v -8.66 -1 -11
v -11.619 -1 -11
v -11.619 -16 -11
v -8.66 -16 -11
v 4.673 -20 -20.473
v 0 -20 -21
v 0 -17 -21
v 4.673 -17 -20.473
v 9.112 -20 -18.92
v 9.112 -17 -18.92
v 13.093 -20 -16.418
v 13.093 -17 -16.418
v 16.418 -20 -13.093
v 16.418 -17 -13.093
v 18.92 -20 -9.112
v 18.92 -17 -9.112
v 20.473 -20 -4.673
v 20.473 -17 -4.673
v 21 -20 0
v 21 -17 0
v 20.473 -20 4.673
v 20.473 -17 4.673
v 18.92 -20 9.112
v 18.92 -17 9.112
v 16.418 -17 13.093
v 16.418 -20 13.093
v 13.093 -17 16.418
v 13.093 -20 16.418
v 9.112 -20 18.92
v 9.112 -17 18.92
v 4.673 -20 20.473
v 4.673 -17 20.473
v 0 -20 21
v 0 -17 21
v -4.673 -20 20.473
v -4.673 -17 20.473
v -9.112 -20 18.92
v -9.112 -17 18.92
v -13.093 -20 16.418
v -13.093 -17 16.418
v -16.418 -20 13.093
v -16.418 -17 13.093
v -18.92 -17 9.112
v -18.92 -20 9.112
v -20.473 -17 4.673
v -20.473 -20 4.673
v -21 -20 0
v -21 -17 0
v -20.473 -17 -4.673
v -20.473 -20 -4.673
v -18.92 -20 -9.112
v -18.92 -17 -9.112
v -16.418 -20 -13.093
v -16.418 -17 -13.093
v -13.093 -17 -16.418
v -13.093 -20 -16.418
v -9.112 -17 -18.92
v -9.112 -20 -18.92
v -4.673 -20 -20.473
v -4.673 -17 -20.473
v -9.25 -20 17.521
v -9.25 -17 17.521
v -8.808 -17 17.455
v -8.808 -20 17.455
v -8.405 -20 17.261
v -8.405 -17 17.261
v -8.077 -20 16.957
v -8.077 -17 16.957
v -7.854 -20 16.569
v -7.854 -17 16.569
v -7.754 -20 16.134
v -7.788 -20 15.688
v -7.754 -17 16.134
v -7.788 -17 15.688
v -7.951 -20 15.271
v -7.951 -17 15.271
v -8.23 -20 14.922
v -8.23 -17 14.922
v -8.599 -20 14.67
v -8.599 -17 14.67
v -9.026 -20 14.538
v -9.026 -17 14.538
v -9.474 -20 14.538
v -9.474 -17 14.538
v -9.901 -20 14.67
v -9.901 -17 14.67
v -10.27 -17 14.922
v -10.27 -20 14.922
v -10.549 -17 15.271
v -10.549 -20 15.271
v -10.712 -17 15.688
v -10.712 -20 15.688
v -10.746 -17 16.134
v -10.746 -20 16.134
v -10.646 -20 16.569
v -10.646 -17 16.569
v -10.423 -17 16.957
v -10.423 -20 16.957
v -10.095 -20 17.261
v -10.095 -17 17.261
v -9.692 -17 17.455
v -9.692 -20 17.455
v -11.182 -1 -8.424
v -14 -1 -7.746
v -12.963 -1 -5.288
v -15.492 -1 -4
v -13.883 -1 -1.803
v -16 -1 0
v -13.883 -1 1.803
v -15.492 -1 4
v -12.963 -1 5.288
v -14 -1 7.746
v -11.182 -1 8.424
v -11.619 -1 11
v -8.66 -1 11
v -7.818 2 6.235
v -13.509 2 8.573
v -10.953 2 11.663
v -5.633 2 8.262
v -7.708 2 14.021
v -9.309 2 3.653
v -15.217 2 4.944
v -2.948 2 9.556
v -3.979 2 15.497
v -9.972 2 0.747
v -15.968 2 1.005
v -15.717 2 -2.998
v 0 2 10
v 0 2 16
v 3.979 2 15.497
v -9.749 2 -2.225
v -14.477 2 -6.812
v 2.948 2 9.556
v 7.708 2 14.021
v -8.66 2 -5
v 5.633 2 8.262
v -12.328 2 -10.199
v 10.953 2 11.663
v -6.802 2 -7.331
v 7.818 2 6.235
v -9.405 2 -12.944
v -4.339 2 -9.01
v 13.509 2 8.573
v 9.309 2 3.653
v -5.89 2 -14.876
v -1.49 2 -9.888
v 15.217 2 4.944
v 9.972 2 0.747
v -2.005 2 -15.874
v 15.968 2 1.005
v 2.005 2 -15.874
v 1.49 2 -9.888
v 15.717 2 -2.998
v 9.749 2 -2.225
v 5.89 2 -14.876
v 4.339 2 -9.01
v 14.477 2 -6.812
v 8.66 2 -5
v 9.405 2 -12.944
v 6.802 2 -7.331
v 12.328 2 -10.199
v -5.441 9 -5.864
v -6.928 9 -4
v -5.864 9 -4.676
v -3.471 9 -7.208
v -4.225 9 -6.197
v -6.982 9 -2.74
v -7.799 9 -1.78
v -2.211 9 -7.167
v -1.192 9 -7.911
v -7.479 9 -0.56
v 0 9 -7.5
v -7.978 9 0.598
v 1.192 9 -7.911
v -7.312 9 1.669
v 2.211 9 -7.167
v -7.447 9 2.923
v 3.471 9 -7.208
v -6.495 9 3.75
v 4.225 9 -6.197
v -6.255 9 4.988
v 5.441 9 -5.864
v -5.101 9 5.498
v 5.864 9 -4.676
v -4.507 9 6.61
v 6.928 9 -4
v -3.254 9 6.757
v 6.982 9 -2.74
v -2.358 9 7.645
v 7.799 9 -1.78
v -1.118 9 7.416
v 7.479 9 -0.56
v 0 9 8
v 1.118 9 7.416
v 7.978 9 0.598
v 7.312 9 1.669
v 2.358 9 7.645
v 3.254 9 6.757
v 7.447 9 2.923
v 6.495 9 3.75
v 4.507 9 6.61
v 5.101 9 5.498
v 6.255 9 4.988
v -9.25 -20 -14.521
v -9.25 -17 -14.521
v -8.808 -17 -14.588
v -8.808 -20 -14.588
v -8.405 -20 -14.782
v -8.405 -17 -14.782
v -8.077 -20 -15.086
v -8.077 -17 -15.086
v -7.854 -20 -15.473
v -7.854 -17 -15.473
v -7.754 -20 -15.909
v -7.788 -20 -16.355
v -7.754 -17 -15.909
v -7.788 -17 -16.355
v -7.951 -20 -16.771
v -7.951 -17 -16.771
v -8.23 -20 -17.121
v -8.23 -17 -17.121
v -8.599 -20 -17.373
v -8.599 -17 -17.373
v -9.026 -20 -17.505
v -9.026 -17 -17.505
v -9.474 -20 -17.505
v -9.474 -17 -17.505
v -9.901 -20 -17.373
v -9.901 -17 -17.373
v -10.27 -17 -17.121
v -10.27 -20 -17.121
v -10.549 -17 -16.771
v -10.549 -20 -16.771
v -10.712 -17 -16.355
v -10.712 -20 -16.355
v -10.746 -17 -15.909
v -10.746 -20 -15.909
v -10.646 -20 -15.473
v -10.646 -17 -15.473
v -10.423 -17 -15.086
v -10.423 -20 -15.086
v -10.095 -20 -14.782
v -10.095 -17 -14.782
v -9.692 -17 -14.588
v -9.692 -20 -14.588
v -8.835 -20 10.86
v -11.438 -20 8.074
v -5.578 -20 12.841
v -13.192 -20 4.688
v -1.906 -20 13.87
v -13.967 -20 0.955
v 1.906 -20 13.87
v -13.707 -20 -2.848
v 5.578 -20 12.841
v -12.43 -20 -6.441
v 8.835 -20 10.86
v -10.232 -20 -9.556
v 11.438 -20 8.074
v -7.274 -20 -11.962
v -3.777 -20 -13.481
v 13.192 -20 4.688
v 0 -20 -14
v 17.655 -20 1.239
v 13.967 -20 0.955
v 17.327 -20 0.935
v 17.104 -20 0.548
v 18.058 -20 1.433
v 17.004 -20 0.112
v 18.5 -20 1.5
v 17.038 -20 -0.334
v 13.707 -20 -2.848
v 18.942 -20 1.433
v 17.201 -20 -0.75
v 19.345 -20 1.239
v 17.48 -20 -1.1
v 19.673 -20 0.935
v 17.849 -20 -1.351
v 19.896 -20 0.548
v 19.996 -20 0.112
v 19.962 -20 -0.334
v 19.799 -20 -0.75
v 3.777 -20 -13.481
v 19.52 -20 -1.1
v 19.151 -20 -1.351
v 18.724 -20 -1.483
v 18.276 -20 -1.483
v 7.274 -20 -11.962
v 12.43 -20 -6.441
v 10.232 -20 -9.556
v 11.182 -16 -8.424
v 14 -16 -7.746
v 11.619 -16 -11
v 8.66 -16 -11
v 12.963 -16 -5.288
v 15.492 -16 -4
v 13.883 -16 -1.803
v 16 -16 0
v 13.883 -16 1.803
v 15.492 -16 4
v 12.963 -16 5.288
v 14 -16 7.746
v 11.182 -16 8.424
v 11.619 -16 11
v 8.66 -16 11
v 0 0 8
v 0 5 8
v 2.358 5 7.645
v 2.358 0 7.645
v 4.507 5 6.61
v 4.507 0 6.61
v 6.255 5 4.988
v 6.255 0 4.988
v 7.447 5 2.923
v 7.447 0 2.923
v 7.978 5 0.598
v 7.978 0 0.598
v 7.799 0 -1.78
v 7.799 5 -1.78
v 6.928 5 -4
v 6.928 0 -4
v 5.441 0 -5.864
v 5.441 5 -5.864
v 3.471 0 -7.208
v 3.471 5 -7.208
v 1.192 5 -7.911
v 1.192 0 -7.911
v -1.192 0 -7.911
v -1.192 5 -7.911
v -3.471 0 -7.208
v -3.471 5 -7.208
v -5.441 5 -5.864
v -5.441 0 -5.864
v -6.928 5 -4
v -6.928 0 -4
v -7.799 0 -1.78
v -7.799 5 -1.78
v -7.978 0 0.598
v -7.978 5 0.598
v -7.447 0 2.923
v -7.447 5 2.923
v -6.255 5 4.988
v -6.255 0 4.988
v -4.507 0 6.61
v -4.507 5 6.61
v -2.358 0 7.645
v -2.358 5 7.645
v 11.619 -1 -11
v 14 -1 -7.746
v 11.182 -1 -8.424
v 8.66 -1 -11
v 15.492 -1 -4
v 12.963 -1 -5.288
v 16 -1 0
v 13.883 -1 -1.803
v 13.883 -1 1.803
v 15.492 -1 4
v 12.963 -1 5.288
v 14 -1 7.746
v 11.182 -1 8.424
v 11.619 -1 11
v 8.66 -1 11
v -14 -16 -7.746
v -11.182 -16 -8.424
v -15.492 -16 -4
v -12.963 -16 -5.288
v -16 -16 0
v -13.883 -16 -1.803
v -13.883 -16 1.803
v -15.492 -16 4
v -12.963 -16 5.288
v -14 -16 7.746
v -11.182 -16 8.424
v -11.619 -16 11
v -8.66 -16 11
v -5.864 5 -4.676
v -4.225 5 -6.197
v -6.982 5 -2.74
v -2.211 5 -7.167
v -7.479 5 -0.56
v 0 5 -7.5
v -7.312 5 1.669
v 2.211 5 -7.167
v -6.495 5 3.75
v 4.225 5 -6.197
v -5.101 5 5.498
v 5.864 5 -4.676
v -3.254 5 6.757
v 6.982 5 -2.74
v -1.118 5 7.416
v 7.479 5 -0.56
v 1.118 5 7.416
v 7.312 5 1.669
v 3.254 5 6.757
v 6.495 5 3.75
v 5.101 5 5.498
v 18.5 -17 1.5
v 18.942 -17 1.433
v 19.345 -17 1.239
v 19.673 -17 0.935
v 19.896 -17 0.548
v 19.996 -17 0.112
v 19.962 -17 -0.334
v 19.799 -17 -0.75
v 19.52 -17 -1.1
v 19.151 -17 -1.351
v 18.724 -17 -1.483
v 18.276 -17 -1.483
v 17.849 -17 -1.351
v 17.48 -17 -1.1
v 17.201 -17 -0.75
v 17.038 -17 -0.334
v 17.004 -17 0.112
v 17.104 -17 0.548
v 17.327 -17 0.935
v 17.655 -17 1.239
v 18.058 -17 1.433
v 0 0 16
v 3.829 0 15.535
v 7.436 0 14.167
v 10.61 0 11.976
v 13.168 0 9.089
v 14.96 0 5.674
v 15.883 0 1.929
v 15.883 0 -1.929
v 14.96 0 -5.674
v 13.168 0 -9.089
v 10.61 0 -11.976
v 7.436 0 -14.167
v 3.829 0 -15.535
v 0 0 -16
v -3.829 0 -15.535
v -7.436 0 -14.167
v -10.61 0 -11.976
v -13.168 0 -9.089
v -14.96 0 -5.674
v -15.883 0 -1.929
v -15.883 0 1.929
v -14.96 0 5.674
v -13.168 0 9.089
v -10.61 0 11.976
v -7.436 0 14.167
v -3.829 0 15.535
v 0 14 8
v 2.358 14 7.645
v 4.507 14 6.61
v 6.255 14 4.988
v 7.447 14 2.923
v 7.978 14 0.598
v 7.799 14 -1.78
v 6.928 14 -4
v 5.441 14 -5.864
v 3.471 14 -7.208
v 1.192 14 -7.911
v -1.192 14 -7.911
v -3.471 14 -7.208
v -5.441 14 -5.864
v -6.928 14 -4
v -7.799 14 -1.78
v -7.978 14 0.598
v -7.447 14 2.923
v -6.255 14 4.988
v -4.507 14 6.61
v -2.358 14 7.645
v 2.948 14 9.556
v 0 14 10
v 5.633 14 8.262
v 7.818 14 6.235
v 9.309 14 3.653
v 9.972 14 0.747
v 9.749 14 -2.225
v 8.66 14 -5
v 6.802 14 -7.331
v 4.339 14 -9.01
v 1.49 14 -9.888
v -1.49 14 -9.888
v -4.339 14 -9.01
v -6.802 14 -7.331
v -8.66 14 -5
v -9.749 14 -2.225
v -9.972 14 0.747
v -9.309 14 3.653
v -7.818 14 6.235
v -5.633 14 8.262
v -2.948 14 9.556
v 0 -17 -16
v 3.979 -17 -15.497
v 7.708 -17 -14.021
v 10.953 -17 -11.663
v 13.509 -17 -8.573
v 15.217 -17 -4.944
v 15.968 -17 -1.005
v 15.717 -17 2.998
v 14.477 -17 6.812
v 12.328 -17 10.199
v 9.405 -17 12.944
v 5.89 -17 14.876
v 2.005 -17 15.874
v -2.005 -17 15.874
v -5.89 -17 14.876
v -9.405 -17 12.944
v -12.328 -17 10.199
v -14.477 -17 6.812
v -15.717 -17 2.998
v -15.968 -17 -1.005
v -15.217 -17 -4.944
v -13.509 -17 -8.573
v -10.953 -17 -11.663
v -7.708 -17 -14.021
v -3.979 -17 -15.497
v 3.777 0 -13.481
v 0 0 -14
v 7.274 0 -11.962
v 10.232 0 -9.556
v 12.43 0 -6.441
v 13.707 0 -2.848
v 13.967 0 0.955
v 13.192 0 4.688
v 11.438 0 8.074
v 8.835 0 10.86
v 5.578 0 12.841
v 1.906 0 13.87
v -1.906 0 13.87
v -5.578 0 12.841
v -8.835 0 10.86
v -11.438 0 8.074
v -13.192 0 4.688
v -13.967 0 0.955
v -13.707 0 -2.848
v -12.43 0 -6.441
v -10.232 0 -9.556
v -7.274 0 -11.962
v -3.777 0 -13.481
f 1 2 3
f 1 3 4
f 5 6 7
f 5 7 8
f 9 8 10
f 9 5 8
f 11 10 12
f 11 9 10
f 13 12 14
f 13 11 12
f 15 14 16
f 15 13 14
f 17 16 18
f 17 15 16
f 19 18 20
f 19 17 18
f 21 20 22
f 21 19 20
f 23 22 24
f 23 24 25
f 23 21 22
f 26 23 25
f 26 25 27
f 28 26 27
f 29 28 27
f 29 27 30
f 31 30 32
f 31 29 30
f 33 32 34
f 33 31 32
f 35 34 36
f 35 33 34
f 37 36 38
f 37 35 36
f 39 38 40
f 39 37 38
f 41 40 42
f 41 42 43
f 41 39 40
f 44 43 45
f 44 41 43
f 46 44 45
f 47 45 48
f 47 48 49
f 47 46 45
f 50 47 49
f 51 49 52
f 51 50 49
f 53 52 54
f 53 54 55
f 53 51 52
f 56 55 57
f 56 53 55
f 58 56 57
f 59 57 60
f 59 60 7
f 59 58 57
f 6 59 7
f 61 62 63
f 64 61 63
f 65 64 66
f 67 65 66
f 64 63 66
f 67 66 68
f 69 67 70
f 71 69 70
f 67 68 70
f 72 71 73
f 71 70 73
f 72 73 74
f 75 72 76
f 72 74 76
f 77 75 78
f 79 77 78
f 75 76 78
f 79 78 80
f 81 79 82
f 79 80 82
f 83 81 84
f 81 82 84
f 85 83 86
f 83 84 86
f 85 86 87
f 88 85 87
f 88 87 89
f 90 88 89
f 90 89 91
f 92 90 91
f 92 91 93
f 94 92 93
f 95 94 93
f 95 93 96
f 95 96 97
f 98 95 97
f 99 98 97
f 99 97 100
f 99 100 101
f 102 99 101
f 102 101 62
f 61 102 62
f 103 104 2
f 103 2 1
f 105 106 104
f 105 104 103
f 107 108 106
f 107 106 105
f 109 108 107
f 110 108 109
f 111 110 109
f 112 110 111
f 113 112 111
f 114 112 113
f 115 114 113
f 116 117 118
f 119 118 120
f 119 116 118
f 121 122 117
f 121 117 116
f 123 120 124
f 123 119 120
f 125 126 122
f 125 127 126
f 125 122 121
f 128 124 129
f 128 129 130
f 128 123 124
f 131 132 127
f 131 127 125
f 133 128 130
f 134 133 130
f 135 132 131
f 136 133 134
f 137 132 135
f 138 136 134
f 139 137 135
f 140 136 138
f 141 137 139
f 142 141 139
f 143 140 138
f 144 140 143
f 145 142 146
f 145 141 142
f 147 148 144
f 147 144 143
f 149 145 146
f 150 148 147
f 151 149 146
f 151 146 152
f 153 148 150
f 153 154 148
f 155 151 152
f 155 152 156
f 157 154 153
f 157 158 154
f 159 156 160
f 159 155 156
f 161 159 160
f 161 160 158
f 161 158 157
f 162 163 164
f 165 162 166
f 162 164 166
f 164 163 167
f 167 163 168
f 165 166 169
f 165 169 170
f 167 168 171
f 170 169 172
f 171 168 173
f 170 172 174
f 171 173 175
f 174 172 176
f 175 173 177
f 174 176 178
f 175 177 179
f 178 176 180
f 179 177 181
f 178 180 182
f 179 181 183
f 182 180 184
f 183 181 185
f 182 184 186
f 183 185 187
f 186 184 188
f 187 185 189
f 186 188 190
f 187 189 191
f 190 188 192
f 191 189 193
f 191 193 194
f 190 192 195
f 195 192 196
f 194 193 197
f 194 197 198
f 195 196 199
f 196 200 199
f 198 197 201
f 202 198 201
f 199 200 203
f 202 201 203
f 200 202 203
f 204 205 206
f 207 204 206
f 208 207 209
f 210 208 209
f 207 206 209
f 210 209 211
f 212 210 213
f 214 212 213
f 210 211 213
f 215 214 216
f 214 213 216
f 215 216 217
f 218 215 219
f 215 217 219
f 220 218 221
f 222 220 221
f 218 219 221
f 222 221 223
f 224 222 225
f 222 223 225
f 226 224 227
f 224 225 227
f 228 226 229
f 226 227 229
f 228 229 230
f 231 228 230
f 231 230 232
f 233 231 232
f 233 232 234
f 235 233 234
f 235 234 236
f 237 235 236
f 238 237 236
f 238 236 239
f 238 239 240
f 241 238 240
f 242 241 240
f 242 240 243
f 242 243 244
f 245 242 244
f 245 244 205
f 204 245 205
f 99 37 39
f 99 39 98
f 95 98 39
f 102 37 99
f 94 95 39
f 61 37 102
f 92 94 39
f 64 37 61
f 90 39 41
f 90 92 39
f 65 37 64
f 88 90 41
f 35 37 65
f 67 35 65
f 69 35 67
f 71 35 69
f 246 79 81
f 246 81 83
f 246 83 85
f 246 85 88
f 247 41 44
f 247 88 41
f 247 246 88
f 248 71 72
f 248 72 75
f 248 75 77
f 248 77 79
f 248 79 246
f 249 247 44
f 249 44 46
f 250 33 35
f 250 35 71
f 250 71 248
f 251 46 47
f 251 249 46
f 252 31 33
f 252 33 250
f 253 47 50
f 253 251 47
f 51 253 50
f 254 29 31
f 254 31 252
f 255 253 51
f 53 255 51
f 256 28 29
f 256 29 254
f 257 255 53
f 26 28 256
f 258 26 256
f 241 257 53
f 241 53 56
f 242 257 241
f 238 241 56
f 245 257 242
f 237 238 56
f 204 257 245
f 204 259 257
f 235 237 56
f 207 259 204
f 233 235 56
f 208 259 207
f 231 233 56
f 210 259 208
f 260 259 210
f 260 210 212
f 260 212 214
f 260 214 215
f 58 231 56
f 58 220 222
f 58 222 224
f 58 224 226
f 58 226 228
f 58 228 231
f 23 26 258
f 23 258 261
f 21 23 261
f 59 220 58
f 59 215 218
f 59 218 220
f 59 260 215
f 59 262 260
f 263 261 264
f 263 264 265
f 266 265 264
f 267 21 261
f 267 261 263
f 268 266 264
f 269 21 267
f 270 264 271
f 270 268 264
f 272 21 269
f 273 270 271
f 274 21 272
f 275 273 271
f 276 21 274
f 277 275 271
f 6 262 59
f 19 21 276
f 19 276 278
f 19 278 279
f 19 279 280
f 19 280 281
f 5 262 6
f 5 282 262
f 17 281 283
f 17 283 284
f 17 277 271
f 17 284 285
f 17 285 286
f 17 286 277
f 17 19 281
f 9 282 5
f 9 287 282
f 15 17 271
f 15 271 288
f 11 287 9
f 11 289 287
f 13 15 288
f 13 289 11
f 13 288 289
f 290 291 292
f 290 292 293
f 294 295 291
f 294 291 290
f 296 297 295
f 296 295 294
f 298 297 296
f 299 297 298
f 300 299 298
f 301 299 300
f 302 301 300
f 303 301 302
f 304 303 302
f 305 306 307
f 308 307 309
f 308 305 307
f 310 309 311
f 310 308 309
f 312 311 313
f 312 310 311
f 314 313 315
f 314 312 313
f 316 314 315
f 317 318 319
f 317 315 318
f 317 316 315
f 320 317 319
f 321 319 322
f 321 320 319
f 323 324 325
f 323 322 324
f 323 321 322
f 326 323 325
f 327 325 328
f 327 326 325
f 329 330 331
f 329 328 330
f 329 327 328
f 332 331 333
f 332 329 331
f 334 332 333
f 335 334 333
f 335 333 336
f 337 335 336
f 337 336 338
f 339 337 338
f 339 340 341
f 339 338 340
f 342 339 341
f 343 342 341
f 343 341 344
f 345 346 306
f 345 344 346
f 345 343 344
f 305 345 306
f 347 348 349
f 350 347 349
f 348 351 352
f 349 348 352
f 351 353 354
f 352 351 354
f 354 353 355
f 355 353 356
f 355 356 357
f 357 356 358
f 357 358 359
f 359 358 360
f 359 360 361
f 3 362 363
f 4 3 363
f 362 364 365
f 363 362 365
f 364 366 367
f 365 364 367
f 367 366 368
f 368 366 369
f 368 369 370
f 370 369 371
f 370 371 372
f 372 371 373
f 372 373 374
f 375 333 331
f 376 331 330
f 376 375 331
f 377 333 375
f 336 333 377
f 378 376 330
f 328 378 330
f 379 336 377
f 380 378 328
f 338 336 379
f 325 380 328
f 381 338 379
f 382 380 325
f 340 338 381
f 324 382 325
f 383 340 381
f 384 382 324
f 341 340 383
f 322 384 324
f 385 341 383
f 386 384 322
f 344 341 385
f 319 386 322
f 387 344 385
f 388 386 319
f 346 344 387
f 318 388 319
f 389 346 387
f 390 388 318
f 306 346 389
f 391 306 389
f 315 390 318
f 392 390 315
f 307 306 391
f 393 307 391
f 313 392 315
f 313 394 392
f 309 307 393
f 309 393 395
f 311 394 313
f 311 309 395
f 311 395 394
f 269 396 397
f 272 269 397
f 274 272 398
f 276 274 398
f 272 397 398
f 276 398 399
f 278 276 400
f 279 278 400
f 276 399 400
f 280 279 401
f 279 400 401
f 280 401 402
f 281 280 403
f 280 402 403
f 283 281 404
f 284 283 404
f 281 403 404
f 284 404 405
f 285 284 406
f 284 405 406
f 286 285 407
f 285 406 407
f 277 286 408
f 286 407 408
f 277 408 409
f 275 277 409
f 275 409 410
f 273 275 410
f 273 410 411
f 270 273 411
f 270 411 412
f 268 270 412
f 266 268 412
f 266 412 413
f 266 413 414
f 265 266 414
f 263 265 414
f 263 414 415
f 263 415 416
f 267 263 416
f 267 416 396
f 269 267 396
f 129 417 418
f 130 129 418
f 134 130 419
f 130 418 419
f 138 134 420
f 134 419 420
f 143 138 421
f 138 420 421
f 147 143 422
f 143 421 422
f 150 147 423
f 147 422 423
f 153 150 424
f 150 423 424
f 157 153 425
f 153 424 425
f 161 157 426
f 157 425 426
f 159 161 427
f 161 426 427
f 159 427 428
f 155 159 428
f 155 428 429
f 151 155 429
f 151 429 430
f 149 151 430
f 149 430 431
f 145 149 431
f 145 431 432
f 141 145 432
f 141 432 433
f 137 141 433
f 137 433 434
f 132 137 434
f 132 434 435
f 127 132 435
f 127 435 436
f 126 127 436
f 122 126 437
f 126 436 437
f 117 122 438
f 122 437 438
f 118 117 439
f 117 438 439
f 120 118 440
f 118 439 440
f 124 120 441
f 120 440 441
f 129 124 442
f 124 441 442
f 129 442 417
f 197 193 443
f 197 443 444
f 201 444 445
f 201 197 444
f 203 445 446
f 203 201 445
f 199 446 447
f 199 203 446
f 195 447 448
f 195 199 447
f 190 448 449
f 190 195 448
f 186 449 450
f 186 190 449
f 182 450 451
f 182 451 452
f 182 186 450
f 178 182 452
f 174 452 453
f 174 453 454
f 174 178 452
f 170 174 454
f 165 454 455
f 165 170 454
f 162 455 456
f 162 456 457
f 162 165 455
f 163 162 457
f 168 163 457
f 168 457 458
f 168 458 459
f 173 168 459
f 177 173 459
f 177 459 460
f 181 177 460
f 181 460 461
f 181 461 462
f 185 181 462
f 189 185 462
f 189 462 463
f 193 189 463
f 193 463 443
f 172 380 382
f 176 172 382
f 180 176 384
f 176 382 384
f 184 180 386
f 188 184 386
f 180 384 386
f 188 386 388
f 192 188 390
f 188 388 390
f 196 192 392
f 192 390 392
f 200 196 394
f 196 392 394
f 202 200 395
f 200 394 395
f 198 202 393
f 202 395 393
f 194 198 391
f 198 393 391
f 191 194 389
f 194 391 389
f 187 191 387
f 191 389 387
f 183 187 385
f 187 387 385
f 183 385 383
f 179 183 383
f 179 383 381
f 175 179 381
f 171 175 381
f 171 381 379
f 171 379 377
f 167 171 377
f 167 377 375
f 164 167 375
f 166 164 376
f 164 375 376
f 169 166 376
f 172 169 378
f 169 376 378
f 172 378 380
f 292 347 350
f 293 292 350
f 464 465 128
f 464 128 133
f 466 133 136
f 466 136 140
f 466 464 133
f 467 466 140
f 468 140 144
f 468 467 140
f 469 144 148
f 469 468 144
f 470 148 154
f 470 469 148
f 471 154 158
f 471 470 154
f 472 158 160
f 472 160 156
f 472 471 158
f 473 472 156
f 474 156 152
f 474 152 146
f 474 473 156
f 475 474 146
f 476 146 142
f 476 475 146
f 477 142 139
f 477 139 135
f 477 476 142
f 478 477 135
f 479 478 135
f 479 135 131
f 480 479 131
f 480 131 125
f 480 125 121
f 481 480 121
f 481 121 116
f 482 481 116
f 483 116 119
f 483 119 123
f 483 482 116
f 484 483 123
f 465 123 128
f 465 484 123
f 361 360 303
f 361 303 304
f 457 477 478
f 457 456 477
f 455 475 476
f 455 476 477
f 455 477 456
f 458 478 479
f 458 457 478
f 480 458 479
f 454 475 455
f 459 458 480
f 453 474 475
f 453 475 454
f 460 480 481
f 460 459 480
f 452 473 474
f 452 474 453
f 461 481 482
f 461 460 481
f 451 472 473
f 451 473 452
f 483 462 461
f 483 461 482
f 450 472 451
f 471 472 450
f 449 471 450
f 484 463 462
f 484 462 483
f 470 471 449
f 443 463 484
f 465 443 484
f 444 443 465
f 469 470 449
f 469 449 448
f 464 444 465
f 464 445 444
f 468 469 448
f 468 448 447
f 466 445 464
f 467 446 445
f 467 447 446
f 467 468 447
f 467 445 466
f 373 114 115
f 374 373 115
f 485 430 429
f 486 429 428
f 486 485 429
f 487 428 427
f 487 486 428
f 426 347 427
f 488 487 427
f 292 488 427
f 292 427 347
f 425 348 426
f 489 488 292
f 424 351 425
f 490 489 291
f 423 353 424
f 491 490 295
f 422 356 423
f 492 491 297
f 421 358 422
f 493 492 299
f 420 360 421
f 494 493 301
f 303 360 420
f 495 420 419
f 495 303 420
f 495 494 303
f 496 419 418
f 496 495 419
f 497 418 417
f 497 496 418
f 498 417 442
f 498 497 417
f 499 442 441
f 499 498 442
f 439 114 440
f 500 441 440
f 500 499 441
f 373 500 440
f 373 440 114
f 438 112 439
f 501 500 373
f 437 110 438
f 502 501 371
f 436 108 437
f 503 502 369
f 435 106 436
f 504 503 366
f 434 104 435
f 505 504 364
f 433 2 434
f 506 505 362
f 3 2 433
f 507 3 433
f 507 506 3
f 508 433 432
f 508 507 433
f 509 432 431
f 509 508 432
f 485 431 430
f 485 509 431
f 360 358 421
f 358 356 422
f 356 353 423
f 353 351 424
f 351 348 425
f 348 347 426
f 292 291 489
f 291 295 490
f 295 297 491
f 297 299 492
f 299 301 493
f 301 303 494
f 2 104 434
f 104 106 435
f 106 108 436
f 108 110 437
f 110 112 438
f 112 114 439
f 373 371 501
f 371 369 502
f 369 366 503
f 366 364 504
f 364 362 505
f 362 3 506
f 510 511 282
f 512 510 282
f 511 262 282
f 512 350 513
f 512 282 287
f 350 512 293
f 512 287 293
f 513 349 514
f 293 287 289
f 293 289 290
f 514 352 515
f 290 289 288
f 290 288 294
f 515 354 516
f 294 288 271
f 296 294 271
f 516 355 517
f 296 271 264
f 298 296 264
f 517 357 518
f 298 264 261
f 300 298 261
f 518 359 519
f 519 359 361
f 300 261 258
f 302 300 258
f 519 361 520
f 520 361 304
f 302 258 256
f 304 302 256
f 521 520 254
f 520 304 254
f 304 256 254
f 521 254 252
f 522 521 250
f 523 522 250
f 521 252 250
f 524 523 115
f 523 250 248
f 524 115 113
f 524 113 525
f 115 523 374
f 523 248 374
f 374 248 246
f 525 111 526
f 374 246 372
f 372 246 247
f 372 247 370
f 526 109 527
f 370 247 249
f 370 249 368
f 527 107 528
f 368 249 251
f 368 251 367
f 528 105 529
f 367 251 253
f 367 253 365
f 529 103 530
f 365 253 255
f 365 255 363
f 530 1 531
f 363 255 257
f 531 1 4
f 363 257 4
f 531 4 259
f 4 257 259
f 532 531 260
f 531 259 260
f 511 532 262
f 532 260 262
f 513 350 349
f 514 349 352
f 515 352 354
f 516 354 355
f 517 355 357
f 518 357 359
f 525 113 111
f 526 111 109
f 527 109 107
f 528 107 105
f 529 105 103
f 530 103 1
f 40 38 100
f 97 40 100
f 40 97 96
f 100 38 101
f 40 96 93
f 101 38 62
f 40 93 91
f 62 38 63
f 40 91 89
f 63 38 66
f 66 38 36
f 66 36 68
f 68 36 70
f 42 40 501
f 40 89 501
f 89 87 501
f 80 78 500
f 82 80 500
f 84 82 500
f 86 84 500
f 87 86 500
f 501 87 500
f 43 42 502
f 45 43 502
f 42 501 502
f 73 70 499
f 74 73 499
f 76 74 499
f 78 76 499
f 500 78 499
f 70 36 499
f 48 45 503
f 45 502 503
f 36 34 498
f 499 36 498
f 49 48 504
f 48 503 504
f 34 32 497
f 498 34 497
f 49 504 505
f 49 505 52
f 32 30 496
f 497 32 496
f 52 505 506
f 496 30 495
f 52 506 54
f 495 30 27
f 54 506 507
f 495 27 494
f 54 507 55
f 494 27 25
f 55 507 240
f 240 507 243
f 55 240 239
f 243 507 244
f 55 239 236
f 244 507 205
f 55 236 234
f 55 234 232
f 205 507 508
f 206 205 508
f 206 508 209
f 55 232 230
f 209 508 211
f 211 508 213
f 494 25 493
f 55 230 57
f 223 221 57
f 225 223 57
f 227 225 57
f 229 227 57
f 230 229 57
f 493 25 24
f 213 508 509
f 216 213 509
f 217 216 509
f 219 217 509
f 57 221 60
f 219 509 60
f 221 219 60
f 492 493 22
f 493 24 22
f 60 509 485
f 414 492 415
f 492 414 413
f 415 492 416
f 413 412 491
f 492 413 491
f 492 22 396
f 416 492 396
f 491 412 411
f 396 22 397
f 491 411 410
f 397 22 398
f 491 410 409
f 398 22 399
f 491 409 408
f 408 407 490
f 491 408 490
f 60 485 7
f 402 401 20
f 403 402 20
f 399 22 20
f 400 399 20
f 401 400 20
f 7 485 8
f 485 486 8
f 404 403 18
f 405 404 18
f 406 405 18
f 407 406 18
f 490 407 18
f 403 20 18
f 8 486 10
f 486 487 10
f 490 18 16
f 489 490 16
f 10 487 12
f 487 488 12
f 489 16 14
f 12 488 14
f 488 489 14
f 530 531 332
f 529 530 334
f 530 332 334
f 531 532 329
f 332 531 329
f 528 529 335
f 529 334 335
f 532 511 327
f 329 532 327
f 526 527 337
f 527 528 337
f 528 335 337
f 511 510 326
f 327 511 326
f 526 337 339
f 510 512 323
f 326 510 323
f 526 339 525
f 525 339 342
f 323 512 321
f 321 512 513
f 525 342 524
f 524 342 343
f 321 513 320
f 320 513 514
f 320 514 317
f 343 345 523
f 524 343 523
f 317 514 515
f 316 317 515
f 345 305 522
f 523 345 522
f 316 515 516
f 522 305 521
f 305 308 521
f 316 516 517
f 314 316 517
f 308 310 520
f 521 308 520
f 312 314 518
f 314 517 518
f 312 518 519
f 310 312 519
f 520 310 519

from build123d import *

# Parameters (mm, degrees)
SKETCH_1_R          = 16
SKETCH_1_R_2        = 8
EXTRUDE_1_DEPTH     = 14
SKETCH_2_R          = 20
SKETCH_2_R_2        = 10
CUT_EXTRUDE_1_DEPTH = 12
EXTRUDE_START       = -5
SKETCH_4_R          = 9.5
SKETCH_4_R_2        = 7.5
EXTRUDE_2_DEPTH     = 4
EXTRUDE_START_2     = 17
SKETCH_6_R          = 16
SKETCH_6_R_2        = 14
EXTRUDE_3_DEPTH     = 17
EXTRUDE_START_3     = 3
SKETCH_7_R          = 21
SKETCH_7_R_2        = 14
EXTRUDE_4_DEPTH     = 3
SKETCH_8_R          = 1.5
CUT_EXTRUDE_4_DEPTH = 10
SKETCH_11_W         = 15
SKETCH_11_H         = 15
CUT_EXTRUDE_5_DEPTH = 11


with BuildPart() as part:
    # 草图1 → 凸台-拉伸1 (new body)
    with BuildSketch(Plane(origin=(0, 0, 0), x_dir=(1, 0, 0), z_dir=(0, 1, 0))):
        with Locations(Location((0, 0, 0), (0, 0, 270))):
            Circle(SKETCH_1_R)
        with Locations(Location((0, 0, 0), (0, 0, 270))):
            Circle(SKETCH_1_R_2, mode=Mode.SUBTRACT)
    extrude(amount=EXTRUDE_1_DEPTH)

    # 草图2 → 切除-拉伸1 (cut)
    with BuildSketch(Plane(origin=(0, 14, 0), x_dir=(1, 0, 0), z_dir=(0, 1, 0))):
        Circle(SKETCH_2_R)
        with Locations(Location((0, 0, 0), (0, 0, 270))):
            Circle(SKETCH_2_R_2, mode=Mode.SUBTRACT)
    extrude(amount=-CUT_EXTRUDE_1_DEPTH, mode=Mode.SUBTRACT)

    # 草图4 → 凸台-拉伸2 (add)
    with BuildSketch(Plane.XZ.offset(EXTRUDE_START)):
        Circle(SKETCH_4_R)
        with Locations(Location((0, 0, 0), (0, 0, 270))):
            Circle(SKETCH_4_R_2, mode=Mode.SUBTRACT)
    extrude(amount=-EXTRUDE_2_DEPTH)

    # 草图6 → 凸台-拉伸3 (add)
    with BuildSketch(Plane.XZ.offset(EXTRUDE_START_2)):
        with Locations(Location((0, 0, 0), (0, 0, 270))):
            Circle(SKETCH_6_R)
        with Locations(Location((0, 0, 0), (0, 0, 270))):
            Circle(SKETCH_6_R_2, mode=Mode.SUBTRACT)
    extrude(amount=-EXTRUDE_3_DEPTH)

    # 草图7 → 凸台-拉伸4 (add)
    with BuildSketch(Plane.XZ.offset(17).offset(EXTRUDE_START_3)):
        with Locations(Location((0, 0, 0), (0, 0, 270))):
            Circle(SKETCH_7_R)
        with Locations(Location((0, 0, 0), (0, 0, 270))):
            Circle(SKETCH_7_R_2, mode=Mode.SUBTRACT)
    extrude(amount=-EXTRUDE_4_DEPTH)

    # 草图8 → 切除-拉伸4 (cut)
    with BuildSketch(Plane(origin=(0, -17, 0), x_dir=(1, 0, 0), z_dir=(0, 1, 0))):
        with Locations(Location((18.5, 0, 0), (0, 0, 270))):
            Circle(SKETCH_8_R)
        with Locations(Location((-9.25, -16.02146997, 0), (0, 0, 270))):
            Circle(SKETCH_8_R)
        with Locations(Location((-9.25, 16.02146997, 0), (0, 0, 270))):
            Circle(SKETCH_8_R)
    extrude(amount=-CUT_EXTRUDE_4_DEPTH, mode=Mode.SUBTRACT)

    # 草图11 → 切除-拉伸5 (cut, symmetric)
    with BuildSketch(Plane.XY):
        with Locations((-8.5, -8.5)):
            Rectangle(SKETCH_11_W, SKETCH_11_H)
    cut_extrude_5 = extrude(amount=CUT_EXTRUDE_5_DEPTH, both=True, mode=Mode.SUBTRACT)

    # 镜向1: 切除-拉伸5 across plane
    add(cut_extrude_5.mirror(Plane(origin=(0, 0, 0), x_dir=(0, 0, 1), z_dir=(1, 0, 0))), mode=Mode.SUBTRACT)


solid = part.part
